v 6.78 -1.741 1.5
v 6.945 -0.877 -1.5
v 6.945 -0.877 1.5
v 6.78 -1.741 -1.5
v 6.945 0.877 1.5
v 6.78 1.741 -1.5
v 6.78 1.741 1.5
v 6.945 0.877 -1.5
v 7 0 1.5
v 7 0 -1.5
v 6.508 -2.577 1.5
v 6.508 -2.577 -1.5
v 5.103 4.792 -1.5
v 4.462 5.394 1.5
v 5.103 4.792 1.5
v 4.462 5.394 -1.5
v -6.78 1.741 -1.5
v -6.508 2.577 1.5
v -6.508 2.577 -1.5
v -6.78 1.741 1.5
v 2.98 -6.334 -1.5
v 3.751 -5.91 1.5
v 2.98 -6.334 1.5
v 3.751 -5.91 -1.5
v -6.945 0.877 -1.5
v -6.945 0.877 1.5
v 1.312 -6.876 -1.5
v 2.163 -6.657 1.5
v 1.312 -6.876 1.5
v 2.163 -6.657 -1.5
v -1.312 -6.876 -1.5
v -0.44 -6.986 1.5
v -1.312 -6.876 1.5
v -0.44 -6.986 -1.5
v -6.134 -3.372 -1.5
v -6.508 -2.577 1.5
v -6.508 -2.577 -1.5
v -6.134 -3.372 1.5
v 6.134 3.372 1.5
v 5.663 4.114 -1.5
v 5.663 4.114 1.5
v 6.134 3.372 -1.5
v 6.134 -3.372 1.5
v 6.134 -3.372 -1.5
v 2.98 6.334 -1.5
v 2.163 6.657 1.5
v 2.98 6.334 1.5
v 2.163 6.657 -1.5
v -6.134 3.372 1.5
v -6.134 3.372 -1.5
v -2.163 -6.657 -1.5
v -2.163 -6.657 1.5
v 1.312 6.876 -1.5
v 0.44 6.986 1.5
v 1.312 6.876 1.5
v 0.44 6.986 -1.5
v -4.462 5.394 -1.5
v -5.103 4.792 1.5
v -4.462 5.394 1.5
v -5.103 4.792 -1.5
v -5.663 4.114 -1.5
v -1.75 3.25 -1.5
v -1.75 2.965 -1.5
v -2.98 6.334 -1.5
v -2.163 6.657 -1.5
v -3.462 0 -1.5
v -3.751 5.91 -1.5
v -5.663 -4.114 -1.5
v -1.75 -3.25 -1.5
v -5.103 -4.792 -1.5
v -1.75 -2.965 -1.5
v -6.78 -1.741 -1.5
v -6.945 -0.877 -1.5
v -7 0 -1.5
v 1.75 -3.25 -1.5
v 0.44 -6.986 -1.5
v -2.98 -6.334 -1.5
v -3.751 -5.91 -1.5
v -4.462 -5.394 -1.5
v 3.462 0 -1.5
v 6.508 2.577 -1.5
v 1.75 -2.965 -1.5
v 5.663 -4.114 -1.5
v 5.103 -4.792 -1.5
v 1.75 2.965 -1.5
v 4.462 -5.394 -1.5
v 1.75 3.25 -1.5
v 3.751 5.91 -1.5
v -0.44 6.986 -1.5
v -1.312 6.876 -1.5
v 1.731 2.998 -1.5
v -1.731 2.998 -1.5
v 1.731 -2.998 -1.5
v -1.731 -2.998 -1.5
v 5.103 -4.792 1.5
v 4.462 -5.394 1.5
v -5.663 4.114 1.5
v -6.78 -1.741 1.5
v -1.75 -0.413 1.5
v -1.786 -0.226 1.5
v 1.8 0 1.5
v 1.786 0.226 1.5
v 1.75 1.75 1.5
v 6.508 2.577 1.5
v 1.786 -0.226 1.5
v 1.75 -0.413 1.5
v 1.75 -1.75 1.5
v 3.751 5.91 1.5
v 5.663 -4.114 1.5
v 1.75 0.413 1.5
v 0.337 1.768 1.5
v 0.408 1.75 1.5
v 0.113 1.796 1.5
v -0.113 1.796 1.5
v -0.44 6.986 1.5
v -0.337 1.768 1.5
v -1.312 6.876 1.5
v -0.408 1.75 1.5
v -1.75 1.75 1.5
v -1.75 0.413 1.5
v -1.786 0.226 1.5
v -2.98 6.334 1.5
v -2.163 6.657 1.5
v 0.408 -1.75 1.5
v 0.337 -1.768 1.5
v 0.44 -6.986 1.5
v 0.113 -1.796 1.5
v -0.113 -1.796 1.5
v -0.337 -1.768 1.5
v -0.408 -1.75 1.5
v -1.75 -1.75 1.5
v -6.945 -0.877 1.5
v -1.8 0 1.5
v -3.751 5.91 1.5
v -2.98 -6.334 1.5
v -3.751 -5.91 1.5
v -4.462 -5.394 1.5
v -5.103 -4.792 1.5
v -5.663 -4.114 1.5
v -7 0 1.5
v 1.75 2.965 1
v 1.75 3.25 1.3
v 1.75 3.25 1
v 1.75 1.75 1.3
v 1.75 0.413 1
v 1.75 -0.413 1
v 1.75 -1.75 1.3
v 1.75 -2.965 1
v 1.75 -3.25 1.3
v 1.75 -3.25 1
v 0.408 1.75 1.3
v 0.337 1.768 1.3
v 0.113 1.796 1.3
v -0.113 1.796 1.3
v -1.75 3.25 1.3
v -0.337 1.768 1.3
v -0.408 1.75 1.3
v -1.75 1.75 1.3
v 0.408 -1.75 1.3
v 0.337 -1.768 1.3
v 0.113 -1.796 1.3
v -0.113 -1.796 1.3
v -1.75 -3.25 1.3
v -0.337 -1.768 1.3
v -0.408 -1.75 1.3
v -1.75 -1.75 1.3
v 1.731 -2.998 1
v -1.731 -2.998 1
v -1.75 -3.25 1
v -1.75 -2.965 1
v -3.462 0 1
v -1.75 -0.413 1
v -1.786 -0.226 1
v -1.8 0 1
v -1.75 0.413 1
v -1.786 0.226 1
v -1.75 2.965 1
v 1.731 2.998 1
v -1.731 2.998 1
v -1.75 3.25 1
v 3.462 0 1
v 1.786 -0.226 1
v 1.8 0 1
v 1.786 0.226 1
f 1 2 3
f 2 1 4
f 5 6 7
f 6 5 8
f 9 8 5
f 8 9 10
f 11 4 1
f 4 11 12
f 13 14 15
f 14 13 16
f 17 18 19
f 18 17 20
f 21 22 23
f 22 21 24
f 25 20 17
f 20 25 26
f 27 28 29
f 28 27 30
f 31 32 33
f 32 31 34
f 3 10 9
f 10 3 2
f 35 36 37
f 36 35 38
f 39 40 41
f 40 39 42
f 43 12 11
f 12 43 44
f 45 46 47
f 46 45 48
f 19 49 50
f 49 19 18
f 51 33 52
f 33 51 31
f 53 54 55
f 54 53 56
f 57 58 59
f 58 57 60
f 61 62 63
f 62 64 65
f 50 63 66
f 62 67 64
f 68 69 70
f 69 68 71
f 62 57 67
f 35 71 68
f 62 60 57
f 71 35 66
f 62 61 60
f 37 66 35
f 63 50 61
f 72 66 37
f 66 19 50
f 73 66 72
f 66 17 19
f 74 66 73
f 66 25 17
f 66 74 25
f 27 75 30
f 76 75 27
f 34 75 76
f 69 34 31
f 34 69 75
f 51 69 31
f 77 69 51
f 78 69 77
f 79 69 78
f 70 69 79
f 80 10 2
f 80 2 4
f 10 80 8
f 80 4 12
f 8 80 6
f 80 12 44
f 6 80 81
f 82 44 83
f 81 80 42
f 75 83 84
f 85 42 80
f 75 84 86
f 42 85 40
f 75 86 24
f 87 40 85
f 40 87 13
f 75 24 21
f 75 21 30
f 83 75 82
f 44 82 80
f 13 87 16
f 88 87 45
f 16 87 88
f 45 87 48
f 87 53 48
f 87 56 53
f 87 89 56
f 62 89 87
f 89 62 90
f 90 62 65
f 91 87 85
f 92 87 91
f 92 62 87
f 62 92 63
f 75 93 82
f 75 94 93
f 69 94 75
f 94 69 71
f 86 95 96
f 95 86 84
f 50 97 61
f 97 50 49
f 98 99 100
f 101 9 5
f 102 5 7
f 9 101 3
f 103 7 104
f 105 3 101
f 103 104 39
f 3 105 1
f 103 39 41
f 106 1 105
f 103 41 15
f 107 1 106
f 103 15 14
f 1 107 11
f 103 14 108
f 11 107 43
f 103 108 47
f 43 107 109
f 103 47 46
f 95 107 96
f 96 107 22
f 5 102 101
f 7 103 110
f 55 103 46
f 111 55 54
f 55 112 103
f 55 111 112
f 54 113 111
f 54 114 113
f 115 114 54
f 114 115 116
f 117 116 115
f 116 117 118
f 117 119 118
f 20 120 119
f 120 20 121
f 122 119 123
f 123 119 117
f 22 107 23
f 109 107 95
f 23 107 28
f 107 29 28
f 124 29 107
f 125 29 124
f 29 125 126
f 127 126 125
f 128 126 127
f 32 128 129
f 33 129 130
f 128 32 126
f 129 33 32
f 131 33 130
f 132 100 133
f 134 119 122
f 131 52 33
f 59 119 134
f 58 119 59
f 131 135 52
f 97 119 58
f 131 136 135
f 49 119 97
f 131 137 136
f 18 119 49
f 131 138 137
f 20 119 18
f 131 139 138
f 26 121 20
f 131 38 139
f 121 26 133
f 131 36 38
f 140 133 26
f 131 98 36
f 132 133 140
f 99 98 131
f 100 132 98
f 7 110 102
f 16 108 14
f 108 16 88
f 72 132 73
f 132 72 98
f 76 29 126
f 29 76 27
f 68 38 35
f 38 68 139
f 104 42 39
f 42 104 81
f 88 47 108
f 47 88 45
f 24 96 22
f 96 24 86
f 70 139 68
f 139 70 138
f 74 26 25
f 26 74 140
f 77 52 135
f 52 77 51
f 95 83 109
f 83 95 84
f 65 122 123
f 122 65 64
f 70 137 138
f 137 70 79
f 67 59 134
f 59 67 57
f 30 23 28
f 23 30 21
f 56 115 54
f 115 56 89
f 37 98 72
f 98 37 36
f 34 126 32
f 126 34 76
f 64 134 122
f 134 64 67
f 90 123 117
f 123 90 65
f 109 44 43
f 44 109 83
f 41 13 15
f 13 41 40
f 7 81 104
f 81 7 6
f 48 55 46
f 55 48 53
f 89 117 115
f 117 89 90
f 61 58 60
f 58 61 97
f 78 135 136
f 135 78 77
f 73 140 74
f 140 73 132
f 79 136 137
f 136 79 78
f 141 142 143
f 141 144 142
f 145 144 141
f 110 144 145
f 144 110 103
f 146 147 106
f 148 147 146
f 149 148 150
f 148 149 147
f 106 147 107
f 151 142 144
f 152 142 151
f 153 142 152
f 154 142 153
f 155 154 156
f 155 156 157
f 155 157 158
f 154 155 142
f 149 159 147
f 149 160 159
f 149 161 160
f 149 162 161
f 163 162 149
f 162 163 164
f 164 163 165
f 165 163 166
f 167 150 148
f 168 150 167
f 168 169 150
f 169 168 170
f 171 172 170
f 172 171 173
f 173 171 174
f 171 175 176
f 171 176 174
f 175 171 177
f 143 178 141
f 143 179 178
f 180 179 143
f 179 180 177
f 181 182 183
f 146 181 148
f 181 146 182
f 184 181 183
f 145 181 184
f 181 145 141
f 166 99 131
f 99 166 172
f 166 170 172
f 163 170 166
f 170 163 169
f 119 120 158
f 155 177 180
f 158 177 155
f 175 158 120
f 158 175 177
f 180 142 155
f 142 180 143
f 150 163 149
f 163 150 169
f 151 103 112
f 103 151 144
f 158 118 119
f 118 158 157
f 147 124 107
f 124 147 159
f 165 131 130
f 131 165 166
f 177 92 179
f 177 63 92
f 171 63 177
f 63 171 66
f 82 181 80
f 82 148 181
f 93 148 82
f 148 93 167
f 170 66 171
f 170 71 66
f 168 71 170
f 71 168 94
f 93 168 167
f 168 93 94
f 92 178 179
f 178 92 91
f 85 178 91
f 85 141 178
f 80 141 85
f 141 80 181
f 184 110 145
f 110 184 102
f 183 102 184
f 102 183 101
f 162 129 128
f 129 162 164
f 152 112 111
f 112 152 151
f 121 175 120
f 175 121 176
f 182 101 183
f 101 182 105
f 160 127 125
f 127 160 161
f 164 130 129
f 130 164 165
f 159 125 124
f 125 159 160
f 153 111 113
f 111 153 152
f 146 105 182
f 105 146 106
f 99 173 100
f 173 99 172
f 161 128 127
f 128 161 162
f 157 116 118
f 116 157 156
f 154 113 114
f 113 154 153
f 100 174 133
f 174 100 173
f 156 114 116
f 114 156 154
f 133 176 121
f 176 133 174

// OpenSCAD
$fn = 50;


difference() {
	union() {
		translate(v = [0, 0, -1.5000000000]) {
			cylinder(h = 3, r = 7.0000000000);
		}
		translate(v = [0, 0, -1.5000000000]) {
			cylinder(h = 3, r = 2.8500000000);
		}
	}
	union() {
		translate(v = [0, 0, -1.5000000000]) {
			rotate(a = [0, 0, 0]) {
				difference() {
					union() {
						translate(v = [-1.7500000000, -3.2500000000, -0.3000000000]) {
							cube(size = [3.5000000000, 6.5000000000, 0.3000000000]);
						}
						translate(v = [-1.7500000000, -1.7500000000, -0.6000000000]) {
							cube(size = [3.5000000000, 3.5000000000, 0.3000000000]);
						}
						translate(v = [-1.7500000000, -3.2500000000, 2.5000000000]) {
							cube(size = [3.5000000000, 6.5000000000, 0.3000000000]);
						}
						translate(v = [-1.7500000000, -1.7500000000, 2.8000000000]) {
							cube(size = [3.5000000000, 3.5000000000, 0.3000000000]);
						}
						linear_extrude(height = 2.5000000000) {
							polygon(points = [[3.4620000000, 0.0000000000], [1.7310000000, 2.9981799479], [-1.7310000000, 2.9981799479], [-3.4620000000, 0.0000000000], [-1.7310000000, -2.9981799479], [1.7310000000, -2.9981799479]]);
						}
						translate(v = [-1.7500000000, -3.2500000000, -0.3000000000]) {
							cube(size = [3.5000000000, 6.5000000000, 0.3000000000]);
						}
						translate(v = [-1.7500000000, -1.7500000000, -0.6000000000]) {
							cube(size = [3.5000000000, 3.5000000000, 0.3000000000]);
						}
						translate(v = [-1.7500000000, -3.2500000000, 2.5000000000]) {
							cube(size = [3.5000000000, 6.5000000000, 0.3000000000]);
						}
						translate(v = [-1.7500000000, -1.7500000000, 2.8000000000]) {
							cube(size = [3.5000000000, 3.5000000000, 0.3000000000]);
						}
						translate(v = [-1.7500000000, -3.2500000000, -0.3000000000]) {
							cube(size = [3.5000000000, 6.5000000000, 0.3000000000]);
						}
						translate(v = [-1.7500000000, -1.7500000000, -0.6000000000]) {
							cube(size = [3.5000000000, 3.5000000000, 0.3000000000]);
						}
						translate(v = [-1.7500000000, -3.2500000000, 2.5000000000]) {
							cube(size = [3.5000000000, 6.5000000000, 0.3000000000]);
						}
						translate(v = [-1.7500000000, -1.7500000000, 2.8000000000]) {
							cube(size = [3.5000000000, 3.5000000000, 0.3000000000]);
						}
					}
					union();
				}
			}
		}
		translate(v = [0, 0, -100.0000000000]) {
			cylinder(h = 200, r = 1.8000000000);
		}
	}
}
